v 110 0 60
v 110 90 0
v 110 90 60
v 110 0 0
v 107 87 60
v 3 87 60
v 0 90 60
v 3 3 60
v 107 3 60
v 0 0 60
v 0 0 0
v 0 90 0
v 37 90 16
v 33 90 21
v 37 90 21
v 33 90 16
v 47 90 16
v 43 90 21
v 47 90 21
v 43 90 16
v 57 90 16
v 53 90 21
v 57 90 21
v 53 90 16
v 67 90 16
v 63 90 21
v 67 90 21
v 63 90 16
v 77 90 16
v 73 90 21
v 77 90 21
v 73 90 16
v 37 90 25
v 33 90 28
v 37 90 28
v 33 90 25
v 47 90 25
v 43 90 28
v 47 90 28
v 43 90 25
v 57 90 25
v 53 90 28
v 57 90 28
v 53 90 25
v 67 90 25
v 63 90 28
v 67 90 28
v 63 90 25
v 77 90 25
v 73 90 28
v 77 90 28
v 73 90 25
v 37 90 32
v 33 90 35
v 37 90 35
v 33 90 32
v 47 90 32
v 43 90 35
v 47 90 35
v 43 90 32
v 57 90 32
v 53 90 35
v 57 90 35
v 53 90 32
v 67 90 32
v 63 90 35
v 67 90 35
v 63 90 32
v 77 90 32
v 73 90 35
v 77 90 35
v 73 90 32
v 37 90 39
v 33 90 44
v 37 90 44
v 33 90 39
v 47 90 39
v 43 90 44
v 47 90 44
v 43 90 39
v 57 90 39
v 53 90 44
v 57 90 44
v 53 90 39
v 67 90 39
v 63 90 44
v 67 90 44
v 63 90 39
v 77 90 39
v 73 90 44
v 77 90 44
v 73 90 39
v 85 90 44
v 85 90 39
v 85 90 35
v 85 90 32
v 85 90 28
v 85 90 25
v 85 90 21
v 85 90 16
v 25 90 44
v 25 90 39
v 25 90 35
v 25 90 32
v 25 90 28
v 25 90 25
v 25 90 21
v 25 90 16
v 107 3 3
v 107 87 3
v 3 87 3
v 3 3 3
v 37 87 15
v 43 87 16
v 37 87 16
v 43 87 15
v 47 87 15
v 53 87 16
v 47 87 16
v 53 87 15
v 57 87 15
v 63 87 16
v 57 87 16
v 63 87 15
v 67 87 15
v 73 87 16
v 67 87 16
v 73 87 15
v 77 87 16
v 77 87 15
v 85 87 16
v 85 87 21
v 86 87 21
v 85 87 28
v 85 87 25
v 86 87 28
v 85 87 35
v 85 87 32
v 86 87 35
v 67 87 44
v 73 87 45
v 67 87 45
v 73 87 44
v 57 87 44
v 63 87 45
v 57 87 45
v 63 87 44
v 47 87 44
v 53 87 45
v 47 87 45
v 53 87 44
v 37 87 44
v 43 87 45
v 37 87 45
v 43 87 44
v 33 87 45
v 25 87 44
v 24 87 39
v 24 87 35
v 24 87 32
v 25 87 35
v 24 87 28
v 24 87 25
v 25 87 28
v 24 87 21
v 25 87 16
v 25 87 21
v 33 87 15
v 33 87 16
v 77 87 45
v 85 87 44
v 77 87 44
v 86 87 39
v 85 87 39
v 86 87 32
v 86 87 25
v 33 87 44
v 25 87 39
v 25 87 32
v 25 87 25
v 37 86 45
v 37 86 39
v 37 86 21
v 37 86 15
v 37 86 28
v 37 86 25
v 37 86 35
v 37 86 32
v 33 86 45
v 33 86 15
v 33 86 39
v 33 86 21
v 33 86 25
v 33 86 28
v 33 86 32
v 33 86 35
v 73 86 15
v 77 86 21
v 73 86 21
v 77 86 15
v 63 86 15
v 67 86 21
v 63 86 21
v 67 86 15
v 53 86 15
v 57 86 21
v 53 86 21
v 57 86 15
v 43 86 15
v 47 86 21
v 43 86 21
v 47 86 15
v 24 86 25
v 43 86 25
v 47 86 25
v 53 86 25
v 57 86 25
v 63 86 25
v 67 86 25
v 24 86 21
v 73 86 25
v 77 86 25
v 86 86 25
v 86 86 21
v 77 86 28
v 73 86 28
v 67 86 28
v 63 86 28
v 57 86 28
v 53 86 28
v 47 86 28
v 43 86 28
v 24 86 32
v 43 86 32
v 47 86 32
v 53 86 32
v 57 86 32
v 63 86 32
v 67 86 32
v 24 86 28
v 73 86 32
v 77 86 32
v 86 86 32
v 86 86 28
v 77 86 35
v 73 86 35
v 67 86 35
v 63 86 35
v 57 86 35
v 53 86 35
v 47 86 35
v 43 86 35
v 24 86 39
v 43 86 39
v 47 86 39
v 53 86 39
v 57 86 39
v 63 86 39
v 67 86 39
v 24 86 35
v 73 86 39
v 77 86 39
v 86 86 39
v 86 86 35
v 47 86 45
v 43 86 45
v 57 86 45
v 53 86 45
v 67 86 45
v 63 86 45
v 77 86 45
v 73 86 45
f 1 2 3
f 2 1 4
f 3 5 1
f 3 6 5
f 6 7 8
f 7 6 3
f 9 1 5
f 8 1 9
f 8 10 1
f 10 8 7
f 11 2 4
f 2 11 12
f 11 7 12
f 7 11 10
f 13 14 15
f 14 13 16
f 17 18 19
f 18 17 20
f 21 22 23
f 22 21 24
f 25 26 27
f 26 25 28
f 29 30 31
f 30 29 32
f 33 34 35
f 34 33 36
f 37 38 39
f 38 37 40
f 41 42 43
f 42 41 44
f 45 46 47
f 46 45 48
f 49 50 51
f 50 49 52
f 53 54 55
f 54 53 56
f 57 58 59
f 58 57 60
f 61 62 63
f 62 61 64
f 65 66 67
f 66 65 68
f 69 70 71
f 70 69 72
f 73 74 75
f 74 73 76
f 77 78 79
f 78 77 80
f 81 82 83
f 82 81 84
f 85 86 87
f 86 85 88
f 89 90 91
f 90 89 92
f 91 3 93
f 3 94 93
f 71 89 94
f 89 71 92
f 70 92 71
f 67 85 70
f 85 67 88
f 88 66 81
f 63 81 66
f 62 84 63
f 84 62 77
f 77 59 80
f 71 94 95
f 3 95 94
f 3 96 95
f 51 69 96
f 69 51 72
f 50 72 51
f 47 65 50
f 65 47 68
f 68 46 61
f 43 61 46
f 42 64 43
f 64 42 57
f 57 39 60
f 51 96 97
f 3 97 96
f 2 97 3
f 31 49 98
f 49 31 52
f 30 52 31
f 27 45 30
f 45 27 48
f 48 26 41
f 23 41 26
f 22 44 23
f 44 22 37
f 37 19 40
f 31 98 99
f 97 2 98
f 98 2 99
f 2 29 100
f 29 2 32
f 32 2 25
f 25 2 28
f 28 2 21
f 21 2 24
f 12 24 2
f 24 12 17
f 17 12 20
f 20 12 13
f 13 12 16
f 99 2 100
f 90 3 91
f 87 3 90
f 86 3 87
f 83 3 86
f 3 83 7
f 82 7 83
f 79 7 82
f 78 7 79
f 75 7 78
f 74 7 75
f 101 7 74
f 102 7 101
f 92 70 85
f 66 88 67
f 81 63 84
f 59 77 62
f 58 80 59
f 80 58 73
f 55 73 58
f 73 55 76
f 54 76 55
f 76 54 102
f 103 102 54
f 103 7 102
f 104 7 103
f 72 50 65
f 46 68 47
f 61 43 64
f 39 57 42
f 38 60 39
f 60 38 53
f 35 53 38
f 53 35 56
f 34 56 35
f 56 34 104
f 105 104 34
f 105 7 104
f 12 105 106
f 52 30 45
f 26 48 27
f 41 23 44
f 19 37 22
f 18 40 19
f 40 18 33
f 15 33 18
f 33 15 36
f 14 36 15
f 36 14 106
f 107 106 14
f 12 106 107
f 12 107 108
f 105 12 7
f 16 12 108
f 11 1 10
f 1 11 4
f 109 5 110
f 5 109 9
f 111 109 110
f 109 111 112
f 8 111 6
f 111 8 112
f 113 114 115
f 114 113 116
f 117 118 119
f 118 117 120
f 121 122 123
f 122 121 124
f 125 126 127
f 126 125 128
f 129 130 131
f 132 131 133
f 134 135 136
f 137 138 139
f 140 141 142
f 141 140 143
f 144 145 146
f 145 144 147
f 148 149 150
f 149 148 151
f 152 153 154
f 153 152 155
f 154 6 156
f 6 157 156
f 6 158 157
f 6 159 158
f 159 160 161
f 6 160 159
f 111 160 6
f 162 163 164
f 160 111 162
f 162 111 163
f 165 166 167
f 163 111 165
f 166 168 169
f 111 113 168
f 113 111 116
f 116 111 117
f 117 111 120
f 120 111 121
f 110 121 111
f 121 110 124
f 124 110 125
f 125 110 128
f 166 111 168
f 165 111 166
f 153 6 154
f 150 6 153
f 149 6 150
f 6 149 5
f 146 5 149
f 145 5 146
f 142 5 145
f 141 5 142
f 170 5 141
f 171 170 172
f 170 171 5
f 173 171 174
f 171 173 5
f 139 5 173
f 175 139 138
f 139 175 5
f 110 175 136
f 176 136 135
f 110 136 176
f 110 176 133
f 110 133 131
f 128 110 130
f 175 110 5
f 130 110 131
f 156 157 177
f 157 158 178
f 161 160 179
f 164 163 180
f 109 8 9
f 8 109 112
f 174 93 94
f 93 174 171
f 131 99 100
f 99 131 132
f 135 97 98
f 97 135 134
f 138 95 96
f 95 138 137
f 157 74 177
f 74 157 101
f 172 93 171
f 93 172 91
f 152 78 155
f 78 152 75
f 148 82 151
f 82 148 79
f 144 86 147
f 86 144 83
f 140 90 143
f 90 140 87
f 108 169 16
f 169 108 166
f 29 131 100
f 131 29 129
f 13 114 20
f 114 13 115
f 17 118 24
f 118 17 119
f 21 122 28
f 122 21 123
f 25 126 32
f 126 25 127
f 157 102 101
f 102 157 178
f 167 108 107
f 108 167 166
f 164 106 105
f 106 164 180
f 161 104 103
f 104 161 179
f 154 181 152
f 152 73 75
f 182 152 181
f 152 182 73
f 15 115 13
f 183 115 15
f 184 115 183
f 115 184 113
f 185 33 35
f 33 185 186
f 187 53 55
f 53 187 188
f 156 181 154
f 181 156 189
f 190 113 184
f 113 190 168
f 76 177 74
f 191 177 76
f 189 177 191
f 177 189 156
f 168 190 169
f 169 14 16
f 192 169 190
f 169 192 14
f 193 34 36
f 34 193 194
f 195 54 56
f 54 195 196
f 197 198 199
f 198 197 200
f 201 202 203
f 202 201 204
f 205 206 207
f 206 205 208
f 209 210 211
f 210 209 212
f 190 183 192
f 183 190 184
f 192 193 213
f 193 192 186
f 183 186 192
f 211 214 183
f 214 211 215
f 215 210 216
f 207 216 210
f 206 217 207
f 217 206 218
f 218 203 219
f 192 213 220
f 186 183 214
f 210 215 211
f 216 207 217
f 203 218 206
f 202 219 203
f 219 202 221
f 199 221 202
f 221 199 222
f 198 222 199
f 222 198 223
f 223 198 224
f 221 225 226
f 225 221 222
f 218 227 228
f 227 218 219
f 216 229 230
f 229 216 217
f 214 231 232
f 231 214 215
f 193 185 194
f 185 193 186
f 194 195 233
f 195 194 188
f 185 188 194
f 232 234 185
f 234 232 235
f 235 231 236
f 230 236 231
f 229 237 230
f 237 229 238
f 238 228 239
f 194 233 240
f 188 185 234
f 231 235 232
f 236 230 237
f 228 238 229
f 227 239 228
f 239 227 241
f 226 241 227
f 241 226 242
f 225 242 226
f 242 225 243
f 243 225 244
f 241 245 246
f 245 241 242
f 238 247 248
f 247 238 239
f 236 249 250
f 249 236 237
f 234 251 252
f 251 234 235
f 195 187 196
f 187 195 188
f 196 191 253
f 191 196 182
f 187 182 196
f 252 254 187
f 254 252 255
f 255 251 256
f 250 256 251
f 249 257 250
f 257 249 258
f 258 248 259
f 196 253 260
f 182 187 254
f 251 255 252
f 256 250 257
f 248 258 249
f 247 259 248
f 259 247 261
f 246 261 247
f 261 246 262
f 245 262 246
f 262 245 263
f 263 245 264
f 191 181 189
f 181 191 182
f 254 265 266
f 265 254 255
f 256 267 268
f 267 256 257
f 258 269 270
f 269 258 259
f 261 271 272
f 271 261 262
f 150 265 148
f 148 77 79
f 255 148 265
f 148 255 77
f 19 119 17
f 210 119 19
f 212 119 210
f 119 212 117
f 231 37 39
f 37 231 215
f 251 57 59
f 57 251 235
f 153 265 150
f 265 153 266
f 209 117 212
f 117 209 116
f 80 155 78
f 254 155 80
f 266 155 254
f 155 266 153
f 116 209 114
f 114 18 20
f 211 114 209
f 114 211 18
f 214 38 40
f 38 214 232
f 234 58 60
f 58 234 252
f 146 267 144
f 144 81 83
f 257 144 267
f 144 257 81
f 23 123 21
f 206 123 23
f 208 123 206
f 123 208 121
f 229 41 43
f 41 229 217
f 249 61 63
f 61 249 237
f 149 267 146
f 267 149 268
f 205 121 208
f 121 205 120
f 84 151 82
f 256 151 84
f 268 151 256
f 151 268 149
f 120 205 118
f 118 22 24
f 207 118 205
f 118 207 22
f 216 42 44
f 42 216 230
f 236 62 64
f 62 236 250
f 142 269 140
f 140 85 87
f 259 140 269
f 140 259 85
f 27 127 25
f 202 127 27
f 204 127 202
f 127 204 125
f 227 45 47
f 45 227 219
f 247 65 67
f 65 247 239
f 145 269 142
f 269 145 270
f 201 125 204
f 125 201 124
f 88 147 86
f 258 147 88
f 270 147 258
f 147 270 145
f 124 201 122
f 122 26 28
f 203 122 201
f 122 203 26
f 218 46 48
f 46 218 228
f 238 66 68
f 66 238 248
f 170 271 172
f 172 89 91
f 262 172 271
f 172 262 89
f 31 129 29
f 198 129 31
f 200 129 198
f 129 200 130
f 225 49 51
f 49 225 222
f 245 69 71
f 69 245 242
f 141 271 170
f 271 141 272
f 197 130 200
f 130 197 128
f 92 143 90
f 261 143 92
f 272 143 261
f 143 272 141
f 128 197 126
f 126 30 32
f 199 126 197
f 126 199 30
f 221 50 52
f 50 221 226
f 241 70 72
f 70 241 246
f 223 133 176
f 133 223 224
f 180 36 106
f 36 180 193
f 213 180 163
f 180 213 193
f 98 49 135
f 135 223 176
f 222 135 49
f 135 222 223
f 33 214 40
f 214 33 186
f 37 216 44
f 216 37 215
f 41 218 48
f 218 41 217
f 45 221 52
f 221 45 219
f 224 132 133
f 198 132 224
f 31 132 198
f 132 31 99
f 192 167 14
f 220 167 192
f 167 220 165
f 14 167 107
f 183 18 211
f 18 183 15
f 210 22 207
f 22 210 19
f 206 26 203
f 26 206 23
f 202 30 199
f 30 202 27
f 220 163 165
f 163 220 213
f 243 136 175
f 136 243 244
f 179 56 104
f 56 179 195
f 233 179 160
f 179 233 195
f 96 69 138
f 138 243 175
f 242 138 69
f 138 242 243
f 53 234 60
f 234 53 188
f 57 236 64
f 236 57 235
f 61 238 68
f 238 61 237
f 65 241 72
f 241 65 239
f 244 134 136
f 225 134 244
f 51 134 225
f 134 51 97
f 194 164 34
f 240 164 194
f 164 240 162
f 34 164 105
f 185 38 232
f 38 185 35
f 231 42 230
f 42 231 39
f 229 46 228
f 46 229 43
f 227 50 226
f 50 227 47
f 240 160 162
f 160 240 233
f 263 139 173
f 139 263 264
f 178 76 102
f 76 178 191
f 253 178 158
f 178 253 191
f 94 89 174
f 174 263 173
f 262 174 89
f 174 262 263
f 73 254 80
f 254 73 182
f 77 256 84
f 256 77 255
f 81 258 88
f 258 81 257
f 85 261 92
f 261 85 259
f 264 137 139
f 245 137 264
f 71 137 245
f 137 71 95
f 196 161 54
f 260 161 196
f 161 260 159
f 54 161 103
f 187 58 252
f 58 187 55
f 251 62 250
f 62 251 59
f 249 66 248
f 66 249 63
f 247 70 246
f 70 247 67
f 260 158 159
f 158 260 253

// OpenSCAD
$fn = 32;

// ----------------------------------------------------------------------
// Vent box: crossgrid enclosure
// ----------------------------------------------------------------------

// --- parameters (mm) ---
box_l = 110;              // box length, X
box_w = 90;               // box width, Y
box_h = 60;               // box height, Z
wall_t = 3;               // shell wall thickness
win_l = 60;               // vent window width, X
win_h = 28;               // vent window height, Z
bar_w = 4;                // grid bar width
n_v = 5;                  // vertical bar count
n_h = 3;                  // horizontal bar count
fit_tol = 0.1;            // tolerance for press fits, mm
free_tol = 0.5;           // tolerance for clearance fits, mm

win_z0 = (box_h - win_h) / 2;  // window lower edge Z
v_step = win_l / (n_v + 1);  // vertical bar step
h_step = win_h / (n_h + 1);  // horizontal bar step

difference() {
  union() {
    difference() {
      cube([box_l, box_w, box_h]);
  translate([wall_t, wall_t, wall_t])
    cube([box_l - 2 * wall_t, box_w - 2 * wall_t, box_h]);
  translate([(box_l - win_l) / 2, box_w - wall_t - 1, win_z0])
    cube([win_l, wall_t + 2, win_h]);
    }
    for (i = [1 : n_v])
      translate([(box_l - win_l) / 2 + i * v_step - bar_w / 2,
                 box_w - wall_t - 1, win_z0 - 1])
        cube([bar_w, wall_t + 1, win_h + 2]);
    for (i = [1 : n_h])
      translate([(box_l - win_l) / 2 - 1, box_w - wall_t - 1,
                 win_z0 + i * h_step - bar_w / 2])
        cube([win_l + 2, wall_t + 1, bar_w]);
  }
}
